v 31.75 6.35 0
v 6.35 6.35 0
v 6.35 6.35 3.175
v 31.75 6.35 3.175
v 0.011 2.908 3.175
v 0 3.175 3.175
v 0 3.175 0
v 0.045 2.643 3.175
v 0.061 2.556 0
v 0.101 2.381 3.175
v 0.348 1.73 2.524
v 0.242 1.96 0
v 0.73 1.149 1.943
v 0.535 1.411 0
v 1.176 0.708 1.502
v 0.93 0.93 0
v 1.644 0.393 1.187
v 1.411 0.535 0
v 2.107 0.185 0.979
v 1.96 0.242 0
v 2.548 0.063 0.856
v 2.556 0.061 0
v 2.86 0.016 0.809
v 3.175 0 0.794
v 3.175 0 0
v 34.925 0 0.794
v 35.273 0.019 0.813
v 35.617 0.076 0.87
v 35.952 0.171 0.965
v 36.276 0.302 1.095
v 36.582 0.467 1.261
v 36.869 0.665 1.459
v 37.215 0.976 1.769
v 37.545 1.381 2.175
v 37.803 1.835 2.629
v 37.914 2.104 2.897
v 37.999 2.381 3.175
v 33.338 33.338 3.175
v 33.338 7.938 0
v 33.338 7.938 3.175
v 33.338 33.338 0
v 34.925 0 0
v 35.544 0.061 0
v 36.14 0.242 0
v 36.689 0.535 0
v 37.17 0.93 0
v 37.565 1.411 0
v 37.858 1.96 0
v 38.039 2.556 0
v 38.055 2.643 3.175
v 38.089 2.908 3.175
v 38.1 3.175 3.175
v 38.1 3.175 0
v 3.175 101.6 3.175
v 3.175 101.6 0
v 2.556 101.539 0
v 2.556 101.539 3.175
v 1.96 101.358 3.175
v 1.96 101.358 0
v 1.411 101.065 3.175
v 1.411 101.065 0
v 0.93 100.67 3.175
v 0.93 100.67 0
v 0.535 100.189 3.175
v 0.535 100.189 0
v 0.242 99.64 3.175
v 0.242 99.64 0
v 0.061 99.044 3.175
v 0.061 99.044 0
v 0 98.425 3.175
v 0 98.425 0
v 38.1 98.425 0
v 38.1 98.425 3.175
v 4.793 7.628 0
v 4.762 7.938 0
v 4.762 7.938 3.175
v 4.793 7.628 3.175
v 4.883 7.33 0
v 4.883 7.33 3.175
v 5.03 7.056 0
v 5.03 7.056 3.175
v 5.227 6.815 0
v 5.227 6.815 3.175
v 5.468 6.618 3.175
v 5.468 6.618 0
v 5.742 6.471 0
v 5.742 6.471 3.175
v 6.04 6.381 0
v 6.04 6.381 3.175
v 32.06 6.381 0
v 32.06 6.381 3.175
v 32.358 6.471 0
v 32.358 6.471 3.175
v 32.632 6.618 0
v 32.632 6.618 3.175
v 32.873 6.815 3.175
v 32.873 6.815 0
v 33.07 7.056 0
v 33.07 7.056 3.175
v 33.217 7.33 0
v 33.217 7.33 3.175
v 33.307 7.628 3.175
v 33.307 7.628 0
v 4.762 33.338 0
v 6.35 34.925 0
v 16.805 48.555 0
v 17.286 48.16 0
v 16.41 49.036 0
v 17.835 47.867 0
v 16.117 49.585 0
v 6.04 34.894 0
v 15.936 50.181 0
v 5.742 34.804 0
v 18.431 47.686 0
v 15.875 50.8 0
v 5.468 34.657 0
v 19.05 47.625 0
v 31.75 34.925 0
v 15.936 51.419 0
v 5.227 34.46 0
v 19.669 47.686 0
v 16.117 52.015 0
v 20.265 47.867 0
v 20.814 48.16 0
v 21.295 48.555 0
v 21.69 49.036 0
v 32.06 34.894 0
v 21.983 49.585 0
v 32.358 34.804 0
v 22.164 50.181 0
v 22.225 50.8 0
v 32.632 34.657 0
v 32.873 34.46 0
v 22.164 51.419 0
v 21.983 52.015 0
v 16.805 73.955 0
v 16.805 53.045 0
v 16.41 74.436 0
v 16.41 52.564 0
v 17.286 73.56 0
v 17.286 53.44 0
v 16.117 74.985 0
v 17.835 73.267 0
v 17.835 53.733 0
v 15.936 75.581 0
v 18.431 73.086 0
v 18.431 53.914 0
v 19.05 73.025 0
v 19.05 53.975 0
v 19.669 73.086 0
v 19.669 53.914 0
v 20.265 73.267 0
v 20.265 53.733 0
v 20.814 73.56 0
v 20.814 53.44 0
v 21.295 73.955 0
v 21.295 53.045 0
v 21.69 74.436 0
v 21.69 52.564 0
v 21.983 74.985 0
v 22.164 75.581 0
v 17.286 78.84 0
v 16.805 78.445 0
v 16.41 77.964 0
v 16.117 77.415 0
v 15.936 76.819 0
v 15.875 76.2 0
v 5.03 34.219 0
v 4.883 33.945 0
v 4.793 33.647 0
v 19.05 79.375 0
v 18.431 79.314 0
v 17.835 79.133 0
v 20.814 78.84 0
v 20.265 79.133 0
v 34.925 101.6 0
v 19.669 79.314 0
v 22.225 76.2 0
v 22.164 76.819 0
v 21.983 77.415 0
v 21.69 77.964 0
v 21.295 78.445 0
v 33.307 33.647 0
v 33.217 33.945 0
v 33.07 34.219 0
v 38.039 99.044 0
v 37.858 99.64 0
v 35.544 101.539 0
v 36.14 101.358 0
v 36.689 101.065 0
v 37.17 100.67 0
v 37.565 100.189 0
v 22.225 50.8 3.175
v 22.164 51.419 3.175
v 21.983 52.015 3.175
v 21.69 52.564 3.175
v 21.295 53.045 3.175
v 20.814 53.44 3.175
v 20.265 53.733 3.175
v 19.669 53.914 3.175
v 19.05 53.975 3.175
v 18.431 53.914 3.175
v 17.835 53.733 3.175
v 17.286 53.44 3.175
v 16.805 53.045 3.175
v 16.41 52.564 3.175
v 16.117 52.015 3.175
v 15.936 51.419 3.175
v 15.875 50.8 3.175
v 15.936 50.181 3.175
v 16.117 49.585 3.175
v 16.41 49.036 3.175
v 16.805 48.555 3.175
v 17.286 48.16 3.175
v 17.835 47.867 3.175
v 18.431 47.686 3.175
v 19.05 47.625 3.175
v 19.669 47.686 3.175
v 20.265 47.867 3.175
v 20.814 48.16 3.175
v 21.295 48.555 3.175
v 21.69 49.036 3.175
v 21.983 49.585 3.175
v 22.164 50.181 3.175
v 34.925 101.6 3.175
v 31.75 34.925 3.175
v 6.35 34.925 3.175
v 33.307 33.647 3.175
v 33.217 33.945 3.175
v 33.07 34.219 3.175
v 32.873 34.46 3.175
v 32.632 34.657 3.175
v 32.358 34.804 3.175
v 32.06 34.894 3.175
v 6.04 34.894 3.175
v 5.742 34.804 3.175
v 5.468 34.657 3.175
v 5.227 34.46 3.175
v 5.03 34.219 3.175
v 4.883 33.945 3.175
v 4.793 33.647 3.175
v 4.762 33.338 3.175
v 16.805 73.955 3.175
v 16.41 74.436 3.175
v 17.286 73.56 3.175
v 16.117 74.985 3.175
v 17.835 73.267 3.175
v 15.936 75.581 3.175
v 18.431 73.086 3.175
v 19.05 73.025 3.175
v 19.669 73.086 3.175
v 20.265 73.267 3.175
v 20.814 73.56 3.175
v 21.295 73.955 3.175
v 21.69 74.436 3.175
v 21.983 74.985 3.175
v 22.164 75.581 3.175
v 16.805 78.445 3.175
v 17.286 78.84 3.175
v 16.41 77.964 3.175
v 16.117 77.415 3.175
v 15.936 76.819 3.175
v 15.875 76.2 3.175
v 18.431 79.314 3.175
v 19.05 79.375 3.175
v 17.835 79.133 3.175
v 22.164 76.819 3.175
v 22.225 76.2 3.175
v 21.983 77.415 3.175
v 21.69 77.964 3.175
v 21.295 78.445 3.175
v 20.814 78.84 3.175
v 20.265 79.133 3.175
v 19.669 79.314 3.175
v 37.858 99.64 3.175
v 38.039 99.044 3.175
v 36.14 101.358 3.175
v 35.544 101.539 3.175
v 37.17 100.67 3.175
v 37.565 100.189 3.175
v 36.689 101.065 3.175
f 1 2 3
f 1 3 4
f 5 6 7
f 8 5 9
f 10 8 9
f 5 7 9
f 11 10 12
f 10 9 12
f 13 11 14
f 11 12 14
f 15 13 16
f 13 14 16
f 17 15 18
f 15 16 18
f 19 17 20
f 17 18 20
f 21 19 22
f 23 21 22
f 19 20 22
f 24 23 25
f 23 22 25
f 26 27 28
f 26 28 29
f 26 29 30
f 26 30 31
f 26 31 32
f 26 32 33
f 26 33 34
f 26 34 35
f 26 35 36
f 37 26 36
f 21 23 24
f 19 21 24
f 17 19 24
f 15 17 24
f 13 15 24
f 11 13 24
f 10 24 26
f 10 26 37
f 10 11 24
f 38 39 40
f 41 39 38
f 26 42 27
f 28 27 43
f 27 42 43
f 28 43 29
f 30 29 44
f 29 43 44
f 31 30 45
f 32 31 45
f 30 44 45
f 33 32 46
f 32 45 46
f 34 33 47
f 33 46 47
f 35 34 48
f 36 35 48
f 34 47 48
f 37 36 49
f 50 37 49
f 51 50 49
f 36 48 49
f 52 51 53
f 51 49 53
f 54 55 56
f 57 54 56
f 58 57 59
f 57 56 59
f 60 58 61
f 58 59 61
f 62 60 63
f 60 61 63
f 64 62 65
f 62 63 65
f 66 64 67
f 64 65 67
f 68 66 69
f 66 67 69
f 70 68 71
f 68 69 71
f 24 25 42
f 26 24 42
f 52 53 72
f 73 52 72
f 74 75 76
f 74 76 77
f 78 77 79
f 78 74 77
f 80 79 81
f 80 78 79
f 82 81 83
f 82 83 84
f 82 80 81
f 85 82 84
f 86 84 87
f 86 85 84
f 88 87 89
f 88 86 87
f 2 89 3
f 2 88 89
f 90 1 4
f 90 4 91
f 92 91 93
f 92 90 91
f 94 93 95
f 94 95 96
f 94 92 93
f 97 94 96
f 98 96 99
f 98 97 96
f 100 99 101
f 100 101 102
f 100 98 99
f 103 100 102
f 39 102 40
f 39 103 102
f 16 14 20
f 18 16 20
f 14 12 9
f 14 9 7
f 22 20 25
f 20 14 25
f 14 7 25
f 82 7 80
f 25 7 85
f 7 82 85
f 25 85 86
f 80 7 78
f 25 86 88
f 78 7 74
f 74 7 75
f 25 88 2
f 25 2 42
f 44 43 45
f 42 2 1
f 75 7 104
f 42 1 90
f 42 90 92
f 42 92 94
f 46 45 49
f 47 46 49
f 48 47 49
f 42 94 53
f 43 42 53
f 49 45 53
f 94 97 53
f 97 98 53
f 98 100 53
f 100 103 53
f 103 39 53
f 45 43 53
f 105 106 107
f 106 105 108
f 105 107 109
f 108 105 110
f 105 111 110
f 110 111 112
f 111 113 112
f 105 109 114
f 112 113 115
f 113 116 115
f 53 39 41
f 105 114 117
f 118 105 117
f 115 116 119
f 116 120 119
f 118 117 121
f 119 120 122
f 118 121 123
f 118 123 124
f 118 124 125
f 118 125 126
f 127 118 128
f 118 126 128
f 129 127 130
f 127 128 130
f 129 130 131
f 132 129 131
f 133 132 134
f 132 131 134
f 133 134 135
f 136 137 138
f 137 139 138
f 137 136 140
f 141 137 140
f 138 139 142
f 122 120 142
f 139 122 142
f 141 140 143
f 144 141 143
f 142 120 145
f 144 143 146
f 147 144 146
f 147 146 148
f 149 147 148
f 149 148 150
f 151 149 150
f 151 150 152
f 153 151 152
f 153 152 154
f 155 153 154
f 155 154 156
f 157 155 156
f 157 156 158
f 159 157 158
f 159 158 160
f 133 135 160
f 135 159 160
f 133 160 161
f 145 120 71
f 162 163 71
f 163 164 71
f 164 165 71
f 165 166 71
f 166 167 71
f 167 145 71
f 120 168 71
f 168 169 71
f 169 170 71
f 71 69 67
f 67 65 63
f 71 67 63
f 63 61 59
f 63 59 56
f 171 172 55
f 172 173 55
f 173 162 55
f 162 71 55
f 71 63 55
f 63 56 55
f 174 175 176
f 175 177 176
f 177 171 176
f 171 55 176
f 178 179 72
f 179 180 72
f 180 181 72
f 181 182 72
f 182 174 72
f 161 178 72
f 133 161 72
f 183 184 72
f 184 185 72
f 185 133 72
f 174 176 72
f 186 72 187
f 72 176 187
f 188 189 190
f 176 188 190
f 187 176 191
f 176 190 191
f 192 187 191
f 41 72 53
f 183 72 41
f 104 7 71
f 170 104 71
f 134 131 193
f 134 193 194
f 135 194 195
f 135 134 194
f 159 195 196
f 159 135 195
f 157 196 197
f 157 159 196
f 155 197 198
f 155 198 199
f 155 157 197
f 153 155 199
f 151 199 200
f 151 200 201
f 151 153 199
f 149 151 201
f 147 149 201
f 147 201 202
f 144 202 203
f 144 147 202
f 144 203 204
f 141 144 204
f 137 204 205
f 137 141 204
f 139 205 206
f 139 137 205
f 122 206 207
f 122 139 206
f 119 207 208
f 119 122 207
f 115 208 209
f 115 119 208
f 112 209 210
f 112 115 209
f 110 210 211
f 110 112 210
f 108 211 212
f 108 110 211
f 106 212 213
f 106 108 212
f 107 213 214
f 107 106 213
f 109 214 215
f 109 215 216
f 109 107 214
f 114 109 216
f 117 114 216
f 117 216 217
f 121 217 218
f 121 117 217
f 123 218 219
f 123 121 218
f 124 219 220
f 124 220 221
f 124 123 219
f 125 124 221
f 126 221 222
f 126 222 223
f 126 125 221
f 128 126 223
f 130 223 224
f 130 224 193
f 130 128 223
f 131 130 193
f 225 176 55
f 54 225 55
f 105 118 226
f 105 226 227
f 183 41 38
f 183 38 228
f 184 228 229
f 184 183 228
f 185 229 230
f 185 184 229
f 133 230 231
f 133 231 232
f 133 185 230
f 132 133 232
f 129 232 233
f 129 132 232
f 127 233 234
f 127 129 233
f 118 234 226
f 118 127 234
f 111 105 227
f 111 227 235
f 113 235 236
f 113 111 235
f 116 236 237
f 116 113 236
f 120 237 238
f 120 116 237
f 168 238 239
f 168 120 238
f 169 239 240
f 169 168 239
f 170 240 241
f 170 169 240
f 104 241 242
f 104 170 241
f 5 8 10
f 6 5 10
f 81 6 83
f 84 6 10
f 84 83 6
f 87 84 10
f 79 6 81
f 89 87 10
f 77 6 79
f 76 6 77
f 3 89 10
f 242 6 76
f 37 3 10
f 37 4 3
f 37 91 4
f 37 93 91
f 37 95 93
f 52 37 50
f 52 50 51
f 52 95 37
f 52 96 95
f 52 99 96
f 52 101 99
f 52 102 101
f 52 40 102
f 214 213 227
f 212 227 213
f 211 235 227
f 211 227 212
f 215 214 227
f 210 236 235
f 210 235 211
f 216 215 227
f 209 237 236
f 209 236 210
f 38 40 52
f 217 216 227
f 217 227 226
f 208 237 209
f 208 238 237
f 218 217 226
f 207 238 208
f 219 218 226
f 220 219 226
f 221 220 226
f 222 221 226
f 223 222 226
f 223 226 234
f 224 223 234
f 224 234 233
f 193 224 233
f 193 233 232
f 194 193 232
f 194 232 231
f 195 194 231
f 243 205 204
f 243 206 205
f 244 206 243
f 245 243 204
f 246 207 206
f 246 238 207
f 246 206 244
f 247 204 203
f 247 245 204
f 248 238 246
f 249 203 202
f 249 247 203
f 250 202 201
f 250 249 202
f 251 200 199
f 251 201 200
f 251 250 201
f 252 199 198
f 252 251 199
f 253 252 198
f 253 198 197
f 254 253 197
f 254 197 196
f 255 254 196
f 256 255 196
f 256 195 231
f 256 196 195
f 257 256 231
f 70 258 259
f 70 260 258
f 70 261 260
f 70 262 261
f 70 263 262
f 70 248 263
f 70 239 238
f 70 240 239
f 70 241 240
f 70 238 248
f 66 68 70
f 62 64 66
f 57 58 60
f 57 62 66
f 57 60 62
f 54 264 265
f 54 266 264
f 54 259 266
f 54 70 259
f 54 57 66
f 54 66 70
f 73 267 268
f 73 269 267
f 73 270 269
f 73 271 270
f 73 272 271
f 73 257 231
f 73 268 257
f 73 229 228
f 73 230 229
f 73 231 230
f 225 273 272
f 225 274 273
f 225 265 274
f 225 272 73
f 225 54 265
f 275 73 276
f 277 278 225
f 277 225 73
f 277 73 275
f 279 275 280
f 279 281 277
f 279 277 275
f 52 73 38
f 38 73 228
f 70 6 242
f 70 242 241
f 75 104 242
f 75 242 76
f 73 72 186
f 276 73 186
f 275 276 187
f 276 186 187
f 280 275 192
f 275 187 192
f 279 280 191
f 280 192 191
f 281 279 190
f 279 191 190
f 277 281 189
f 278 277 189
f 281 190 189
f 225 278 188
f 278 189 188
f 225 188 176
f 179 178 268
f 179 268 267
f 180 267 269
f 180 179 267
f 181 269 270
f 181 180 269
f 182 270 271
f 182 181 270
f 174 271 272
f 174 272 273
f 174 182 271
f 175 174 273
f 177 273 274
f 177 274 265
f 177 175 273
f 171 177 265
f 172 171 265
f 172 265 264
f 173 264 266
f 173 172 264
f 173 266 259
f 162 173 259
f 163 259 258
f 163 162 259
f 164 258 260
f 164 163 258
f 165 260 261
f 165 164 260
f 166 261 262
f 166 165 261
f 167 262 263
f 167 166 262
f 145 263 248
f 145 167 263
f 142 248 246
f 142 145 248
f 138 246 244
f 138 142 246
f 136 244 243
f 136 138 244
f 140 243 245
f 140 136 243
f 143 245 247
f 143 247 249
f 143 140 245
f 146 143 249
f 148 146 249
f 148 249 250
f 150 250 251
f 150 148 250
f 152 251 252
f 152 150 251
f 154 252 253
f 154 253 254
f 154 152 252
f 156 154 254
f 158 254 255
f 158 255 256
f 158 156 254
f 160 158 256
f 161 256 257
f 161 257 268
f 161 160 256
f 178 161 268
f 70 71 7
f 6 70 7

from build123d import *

# Parameters (mm, degrees)
SKETCH1_R           = 3.175
BOSS_EXTRUDE1_DEPTH = 3.175
CUT_EXTRUDE1_DEPTH  = 85.471


with BuildPart() as part:
    # Sketch1 → Boss-Extrude1 (new body)
    with BuildSketch(Plane.XY):
        with BuildLine():
            Line((3.175, 0), (34.925, 0))
            ThreePointArc((34.925, 0), (37.17006403, 0.92993597), (38.1, 3.175))
            Line((38.1, 3.175), (38.1, 98.425))
            ThreePointArc((38.1, 98.425), (37.17006403, 100.67006403), (34.925, 101.6))
            Line((34.925, 101.6), (3.175, 101.6))
            ThreePointArc((3.175, 101.6), (0.92993597, 100.67006403), (0, 98.425))
            Line((0, 98.425), (0, 3.175))
            ThreePointArc((0, 3.175), (0.92993597, 0.92993597), (3.175, 0))
        make_face()
        with Locations((19.05, 50.8)):
            Circle(SKETCH1_R, mode=Mode.SUBTRACT)
        with Locations((19.05, 76.2)):
            Circle(SKETCH1_R, mode=Mode.SUBTRACT)
        with BuildLine():
            Line((6.35, 6.35), (31.75, 6.35))
            ThreePointArc((31.75, 6.35), (32.872532015, 6.814967985), (33.3375, 7.9375))
            Line((33.3375, 7.9375), (33.3375, 33.3375))
            ThreePointArc((33.3375, 33.3375), (32.872532015, 34.460032015), (31.75, 34.925))
            Line((31.75, 34.925), (6.35, 34.925))
            ThreePointArc((6.35, 34.925), (5.227467985, 34.460032015), (4.7625, 33.3375))
            Line((4.7625, 33.3375), (4.7625, 7.9375))
            ThreePointArc((4.7625, 7.9375), (5.227467985, 6.814967985), (6.35, 6.35))
        make_face(mode=Mode.SUBTRACT)
    extrude(amount=BOSS_EXTRUDE1_DEPTH)

    # Sketch2 → Cut-Extrude1 (cut)
    with BuildSketch(Plane.ZY):
        Polygon((0.79375, 0), (3.175, 2.38125), (3.175, 0), align=None)
    extrude(amount=-CUT_EXTRUDE1_DEPTH, mode=Mode.SUBTRACT)


solid = part.part
